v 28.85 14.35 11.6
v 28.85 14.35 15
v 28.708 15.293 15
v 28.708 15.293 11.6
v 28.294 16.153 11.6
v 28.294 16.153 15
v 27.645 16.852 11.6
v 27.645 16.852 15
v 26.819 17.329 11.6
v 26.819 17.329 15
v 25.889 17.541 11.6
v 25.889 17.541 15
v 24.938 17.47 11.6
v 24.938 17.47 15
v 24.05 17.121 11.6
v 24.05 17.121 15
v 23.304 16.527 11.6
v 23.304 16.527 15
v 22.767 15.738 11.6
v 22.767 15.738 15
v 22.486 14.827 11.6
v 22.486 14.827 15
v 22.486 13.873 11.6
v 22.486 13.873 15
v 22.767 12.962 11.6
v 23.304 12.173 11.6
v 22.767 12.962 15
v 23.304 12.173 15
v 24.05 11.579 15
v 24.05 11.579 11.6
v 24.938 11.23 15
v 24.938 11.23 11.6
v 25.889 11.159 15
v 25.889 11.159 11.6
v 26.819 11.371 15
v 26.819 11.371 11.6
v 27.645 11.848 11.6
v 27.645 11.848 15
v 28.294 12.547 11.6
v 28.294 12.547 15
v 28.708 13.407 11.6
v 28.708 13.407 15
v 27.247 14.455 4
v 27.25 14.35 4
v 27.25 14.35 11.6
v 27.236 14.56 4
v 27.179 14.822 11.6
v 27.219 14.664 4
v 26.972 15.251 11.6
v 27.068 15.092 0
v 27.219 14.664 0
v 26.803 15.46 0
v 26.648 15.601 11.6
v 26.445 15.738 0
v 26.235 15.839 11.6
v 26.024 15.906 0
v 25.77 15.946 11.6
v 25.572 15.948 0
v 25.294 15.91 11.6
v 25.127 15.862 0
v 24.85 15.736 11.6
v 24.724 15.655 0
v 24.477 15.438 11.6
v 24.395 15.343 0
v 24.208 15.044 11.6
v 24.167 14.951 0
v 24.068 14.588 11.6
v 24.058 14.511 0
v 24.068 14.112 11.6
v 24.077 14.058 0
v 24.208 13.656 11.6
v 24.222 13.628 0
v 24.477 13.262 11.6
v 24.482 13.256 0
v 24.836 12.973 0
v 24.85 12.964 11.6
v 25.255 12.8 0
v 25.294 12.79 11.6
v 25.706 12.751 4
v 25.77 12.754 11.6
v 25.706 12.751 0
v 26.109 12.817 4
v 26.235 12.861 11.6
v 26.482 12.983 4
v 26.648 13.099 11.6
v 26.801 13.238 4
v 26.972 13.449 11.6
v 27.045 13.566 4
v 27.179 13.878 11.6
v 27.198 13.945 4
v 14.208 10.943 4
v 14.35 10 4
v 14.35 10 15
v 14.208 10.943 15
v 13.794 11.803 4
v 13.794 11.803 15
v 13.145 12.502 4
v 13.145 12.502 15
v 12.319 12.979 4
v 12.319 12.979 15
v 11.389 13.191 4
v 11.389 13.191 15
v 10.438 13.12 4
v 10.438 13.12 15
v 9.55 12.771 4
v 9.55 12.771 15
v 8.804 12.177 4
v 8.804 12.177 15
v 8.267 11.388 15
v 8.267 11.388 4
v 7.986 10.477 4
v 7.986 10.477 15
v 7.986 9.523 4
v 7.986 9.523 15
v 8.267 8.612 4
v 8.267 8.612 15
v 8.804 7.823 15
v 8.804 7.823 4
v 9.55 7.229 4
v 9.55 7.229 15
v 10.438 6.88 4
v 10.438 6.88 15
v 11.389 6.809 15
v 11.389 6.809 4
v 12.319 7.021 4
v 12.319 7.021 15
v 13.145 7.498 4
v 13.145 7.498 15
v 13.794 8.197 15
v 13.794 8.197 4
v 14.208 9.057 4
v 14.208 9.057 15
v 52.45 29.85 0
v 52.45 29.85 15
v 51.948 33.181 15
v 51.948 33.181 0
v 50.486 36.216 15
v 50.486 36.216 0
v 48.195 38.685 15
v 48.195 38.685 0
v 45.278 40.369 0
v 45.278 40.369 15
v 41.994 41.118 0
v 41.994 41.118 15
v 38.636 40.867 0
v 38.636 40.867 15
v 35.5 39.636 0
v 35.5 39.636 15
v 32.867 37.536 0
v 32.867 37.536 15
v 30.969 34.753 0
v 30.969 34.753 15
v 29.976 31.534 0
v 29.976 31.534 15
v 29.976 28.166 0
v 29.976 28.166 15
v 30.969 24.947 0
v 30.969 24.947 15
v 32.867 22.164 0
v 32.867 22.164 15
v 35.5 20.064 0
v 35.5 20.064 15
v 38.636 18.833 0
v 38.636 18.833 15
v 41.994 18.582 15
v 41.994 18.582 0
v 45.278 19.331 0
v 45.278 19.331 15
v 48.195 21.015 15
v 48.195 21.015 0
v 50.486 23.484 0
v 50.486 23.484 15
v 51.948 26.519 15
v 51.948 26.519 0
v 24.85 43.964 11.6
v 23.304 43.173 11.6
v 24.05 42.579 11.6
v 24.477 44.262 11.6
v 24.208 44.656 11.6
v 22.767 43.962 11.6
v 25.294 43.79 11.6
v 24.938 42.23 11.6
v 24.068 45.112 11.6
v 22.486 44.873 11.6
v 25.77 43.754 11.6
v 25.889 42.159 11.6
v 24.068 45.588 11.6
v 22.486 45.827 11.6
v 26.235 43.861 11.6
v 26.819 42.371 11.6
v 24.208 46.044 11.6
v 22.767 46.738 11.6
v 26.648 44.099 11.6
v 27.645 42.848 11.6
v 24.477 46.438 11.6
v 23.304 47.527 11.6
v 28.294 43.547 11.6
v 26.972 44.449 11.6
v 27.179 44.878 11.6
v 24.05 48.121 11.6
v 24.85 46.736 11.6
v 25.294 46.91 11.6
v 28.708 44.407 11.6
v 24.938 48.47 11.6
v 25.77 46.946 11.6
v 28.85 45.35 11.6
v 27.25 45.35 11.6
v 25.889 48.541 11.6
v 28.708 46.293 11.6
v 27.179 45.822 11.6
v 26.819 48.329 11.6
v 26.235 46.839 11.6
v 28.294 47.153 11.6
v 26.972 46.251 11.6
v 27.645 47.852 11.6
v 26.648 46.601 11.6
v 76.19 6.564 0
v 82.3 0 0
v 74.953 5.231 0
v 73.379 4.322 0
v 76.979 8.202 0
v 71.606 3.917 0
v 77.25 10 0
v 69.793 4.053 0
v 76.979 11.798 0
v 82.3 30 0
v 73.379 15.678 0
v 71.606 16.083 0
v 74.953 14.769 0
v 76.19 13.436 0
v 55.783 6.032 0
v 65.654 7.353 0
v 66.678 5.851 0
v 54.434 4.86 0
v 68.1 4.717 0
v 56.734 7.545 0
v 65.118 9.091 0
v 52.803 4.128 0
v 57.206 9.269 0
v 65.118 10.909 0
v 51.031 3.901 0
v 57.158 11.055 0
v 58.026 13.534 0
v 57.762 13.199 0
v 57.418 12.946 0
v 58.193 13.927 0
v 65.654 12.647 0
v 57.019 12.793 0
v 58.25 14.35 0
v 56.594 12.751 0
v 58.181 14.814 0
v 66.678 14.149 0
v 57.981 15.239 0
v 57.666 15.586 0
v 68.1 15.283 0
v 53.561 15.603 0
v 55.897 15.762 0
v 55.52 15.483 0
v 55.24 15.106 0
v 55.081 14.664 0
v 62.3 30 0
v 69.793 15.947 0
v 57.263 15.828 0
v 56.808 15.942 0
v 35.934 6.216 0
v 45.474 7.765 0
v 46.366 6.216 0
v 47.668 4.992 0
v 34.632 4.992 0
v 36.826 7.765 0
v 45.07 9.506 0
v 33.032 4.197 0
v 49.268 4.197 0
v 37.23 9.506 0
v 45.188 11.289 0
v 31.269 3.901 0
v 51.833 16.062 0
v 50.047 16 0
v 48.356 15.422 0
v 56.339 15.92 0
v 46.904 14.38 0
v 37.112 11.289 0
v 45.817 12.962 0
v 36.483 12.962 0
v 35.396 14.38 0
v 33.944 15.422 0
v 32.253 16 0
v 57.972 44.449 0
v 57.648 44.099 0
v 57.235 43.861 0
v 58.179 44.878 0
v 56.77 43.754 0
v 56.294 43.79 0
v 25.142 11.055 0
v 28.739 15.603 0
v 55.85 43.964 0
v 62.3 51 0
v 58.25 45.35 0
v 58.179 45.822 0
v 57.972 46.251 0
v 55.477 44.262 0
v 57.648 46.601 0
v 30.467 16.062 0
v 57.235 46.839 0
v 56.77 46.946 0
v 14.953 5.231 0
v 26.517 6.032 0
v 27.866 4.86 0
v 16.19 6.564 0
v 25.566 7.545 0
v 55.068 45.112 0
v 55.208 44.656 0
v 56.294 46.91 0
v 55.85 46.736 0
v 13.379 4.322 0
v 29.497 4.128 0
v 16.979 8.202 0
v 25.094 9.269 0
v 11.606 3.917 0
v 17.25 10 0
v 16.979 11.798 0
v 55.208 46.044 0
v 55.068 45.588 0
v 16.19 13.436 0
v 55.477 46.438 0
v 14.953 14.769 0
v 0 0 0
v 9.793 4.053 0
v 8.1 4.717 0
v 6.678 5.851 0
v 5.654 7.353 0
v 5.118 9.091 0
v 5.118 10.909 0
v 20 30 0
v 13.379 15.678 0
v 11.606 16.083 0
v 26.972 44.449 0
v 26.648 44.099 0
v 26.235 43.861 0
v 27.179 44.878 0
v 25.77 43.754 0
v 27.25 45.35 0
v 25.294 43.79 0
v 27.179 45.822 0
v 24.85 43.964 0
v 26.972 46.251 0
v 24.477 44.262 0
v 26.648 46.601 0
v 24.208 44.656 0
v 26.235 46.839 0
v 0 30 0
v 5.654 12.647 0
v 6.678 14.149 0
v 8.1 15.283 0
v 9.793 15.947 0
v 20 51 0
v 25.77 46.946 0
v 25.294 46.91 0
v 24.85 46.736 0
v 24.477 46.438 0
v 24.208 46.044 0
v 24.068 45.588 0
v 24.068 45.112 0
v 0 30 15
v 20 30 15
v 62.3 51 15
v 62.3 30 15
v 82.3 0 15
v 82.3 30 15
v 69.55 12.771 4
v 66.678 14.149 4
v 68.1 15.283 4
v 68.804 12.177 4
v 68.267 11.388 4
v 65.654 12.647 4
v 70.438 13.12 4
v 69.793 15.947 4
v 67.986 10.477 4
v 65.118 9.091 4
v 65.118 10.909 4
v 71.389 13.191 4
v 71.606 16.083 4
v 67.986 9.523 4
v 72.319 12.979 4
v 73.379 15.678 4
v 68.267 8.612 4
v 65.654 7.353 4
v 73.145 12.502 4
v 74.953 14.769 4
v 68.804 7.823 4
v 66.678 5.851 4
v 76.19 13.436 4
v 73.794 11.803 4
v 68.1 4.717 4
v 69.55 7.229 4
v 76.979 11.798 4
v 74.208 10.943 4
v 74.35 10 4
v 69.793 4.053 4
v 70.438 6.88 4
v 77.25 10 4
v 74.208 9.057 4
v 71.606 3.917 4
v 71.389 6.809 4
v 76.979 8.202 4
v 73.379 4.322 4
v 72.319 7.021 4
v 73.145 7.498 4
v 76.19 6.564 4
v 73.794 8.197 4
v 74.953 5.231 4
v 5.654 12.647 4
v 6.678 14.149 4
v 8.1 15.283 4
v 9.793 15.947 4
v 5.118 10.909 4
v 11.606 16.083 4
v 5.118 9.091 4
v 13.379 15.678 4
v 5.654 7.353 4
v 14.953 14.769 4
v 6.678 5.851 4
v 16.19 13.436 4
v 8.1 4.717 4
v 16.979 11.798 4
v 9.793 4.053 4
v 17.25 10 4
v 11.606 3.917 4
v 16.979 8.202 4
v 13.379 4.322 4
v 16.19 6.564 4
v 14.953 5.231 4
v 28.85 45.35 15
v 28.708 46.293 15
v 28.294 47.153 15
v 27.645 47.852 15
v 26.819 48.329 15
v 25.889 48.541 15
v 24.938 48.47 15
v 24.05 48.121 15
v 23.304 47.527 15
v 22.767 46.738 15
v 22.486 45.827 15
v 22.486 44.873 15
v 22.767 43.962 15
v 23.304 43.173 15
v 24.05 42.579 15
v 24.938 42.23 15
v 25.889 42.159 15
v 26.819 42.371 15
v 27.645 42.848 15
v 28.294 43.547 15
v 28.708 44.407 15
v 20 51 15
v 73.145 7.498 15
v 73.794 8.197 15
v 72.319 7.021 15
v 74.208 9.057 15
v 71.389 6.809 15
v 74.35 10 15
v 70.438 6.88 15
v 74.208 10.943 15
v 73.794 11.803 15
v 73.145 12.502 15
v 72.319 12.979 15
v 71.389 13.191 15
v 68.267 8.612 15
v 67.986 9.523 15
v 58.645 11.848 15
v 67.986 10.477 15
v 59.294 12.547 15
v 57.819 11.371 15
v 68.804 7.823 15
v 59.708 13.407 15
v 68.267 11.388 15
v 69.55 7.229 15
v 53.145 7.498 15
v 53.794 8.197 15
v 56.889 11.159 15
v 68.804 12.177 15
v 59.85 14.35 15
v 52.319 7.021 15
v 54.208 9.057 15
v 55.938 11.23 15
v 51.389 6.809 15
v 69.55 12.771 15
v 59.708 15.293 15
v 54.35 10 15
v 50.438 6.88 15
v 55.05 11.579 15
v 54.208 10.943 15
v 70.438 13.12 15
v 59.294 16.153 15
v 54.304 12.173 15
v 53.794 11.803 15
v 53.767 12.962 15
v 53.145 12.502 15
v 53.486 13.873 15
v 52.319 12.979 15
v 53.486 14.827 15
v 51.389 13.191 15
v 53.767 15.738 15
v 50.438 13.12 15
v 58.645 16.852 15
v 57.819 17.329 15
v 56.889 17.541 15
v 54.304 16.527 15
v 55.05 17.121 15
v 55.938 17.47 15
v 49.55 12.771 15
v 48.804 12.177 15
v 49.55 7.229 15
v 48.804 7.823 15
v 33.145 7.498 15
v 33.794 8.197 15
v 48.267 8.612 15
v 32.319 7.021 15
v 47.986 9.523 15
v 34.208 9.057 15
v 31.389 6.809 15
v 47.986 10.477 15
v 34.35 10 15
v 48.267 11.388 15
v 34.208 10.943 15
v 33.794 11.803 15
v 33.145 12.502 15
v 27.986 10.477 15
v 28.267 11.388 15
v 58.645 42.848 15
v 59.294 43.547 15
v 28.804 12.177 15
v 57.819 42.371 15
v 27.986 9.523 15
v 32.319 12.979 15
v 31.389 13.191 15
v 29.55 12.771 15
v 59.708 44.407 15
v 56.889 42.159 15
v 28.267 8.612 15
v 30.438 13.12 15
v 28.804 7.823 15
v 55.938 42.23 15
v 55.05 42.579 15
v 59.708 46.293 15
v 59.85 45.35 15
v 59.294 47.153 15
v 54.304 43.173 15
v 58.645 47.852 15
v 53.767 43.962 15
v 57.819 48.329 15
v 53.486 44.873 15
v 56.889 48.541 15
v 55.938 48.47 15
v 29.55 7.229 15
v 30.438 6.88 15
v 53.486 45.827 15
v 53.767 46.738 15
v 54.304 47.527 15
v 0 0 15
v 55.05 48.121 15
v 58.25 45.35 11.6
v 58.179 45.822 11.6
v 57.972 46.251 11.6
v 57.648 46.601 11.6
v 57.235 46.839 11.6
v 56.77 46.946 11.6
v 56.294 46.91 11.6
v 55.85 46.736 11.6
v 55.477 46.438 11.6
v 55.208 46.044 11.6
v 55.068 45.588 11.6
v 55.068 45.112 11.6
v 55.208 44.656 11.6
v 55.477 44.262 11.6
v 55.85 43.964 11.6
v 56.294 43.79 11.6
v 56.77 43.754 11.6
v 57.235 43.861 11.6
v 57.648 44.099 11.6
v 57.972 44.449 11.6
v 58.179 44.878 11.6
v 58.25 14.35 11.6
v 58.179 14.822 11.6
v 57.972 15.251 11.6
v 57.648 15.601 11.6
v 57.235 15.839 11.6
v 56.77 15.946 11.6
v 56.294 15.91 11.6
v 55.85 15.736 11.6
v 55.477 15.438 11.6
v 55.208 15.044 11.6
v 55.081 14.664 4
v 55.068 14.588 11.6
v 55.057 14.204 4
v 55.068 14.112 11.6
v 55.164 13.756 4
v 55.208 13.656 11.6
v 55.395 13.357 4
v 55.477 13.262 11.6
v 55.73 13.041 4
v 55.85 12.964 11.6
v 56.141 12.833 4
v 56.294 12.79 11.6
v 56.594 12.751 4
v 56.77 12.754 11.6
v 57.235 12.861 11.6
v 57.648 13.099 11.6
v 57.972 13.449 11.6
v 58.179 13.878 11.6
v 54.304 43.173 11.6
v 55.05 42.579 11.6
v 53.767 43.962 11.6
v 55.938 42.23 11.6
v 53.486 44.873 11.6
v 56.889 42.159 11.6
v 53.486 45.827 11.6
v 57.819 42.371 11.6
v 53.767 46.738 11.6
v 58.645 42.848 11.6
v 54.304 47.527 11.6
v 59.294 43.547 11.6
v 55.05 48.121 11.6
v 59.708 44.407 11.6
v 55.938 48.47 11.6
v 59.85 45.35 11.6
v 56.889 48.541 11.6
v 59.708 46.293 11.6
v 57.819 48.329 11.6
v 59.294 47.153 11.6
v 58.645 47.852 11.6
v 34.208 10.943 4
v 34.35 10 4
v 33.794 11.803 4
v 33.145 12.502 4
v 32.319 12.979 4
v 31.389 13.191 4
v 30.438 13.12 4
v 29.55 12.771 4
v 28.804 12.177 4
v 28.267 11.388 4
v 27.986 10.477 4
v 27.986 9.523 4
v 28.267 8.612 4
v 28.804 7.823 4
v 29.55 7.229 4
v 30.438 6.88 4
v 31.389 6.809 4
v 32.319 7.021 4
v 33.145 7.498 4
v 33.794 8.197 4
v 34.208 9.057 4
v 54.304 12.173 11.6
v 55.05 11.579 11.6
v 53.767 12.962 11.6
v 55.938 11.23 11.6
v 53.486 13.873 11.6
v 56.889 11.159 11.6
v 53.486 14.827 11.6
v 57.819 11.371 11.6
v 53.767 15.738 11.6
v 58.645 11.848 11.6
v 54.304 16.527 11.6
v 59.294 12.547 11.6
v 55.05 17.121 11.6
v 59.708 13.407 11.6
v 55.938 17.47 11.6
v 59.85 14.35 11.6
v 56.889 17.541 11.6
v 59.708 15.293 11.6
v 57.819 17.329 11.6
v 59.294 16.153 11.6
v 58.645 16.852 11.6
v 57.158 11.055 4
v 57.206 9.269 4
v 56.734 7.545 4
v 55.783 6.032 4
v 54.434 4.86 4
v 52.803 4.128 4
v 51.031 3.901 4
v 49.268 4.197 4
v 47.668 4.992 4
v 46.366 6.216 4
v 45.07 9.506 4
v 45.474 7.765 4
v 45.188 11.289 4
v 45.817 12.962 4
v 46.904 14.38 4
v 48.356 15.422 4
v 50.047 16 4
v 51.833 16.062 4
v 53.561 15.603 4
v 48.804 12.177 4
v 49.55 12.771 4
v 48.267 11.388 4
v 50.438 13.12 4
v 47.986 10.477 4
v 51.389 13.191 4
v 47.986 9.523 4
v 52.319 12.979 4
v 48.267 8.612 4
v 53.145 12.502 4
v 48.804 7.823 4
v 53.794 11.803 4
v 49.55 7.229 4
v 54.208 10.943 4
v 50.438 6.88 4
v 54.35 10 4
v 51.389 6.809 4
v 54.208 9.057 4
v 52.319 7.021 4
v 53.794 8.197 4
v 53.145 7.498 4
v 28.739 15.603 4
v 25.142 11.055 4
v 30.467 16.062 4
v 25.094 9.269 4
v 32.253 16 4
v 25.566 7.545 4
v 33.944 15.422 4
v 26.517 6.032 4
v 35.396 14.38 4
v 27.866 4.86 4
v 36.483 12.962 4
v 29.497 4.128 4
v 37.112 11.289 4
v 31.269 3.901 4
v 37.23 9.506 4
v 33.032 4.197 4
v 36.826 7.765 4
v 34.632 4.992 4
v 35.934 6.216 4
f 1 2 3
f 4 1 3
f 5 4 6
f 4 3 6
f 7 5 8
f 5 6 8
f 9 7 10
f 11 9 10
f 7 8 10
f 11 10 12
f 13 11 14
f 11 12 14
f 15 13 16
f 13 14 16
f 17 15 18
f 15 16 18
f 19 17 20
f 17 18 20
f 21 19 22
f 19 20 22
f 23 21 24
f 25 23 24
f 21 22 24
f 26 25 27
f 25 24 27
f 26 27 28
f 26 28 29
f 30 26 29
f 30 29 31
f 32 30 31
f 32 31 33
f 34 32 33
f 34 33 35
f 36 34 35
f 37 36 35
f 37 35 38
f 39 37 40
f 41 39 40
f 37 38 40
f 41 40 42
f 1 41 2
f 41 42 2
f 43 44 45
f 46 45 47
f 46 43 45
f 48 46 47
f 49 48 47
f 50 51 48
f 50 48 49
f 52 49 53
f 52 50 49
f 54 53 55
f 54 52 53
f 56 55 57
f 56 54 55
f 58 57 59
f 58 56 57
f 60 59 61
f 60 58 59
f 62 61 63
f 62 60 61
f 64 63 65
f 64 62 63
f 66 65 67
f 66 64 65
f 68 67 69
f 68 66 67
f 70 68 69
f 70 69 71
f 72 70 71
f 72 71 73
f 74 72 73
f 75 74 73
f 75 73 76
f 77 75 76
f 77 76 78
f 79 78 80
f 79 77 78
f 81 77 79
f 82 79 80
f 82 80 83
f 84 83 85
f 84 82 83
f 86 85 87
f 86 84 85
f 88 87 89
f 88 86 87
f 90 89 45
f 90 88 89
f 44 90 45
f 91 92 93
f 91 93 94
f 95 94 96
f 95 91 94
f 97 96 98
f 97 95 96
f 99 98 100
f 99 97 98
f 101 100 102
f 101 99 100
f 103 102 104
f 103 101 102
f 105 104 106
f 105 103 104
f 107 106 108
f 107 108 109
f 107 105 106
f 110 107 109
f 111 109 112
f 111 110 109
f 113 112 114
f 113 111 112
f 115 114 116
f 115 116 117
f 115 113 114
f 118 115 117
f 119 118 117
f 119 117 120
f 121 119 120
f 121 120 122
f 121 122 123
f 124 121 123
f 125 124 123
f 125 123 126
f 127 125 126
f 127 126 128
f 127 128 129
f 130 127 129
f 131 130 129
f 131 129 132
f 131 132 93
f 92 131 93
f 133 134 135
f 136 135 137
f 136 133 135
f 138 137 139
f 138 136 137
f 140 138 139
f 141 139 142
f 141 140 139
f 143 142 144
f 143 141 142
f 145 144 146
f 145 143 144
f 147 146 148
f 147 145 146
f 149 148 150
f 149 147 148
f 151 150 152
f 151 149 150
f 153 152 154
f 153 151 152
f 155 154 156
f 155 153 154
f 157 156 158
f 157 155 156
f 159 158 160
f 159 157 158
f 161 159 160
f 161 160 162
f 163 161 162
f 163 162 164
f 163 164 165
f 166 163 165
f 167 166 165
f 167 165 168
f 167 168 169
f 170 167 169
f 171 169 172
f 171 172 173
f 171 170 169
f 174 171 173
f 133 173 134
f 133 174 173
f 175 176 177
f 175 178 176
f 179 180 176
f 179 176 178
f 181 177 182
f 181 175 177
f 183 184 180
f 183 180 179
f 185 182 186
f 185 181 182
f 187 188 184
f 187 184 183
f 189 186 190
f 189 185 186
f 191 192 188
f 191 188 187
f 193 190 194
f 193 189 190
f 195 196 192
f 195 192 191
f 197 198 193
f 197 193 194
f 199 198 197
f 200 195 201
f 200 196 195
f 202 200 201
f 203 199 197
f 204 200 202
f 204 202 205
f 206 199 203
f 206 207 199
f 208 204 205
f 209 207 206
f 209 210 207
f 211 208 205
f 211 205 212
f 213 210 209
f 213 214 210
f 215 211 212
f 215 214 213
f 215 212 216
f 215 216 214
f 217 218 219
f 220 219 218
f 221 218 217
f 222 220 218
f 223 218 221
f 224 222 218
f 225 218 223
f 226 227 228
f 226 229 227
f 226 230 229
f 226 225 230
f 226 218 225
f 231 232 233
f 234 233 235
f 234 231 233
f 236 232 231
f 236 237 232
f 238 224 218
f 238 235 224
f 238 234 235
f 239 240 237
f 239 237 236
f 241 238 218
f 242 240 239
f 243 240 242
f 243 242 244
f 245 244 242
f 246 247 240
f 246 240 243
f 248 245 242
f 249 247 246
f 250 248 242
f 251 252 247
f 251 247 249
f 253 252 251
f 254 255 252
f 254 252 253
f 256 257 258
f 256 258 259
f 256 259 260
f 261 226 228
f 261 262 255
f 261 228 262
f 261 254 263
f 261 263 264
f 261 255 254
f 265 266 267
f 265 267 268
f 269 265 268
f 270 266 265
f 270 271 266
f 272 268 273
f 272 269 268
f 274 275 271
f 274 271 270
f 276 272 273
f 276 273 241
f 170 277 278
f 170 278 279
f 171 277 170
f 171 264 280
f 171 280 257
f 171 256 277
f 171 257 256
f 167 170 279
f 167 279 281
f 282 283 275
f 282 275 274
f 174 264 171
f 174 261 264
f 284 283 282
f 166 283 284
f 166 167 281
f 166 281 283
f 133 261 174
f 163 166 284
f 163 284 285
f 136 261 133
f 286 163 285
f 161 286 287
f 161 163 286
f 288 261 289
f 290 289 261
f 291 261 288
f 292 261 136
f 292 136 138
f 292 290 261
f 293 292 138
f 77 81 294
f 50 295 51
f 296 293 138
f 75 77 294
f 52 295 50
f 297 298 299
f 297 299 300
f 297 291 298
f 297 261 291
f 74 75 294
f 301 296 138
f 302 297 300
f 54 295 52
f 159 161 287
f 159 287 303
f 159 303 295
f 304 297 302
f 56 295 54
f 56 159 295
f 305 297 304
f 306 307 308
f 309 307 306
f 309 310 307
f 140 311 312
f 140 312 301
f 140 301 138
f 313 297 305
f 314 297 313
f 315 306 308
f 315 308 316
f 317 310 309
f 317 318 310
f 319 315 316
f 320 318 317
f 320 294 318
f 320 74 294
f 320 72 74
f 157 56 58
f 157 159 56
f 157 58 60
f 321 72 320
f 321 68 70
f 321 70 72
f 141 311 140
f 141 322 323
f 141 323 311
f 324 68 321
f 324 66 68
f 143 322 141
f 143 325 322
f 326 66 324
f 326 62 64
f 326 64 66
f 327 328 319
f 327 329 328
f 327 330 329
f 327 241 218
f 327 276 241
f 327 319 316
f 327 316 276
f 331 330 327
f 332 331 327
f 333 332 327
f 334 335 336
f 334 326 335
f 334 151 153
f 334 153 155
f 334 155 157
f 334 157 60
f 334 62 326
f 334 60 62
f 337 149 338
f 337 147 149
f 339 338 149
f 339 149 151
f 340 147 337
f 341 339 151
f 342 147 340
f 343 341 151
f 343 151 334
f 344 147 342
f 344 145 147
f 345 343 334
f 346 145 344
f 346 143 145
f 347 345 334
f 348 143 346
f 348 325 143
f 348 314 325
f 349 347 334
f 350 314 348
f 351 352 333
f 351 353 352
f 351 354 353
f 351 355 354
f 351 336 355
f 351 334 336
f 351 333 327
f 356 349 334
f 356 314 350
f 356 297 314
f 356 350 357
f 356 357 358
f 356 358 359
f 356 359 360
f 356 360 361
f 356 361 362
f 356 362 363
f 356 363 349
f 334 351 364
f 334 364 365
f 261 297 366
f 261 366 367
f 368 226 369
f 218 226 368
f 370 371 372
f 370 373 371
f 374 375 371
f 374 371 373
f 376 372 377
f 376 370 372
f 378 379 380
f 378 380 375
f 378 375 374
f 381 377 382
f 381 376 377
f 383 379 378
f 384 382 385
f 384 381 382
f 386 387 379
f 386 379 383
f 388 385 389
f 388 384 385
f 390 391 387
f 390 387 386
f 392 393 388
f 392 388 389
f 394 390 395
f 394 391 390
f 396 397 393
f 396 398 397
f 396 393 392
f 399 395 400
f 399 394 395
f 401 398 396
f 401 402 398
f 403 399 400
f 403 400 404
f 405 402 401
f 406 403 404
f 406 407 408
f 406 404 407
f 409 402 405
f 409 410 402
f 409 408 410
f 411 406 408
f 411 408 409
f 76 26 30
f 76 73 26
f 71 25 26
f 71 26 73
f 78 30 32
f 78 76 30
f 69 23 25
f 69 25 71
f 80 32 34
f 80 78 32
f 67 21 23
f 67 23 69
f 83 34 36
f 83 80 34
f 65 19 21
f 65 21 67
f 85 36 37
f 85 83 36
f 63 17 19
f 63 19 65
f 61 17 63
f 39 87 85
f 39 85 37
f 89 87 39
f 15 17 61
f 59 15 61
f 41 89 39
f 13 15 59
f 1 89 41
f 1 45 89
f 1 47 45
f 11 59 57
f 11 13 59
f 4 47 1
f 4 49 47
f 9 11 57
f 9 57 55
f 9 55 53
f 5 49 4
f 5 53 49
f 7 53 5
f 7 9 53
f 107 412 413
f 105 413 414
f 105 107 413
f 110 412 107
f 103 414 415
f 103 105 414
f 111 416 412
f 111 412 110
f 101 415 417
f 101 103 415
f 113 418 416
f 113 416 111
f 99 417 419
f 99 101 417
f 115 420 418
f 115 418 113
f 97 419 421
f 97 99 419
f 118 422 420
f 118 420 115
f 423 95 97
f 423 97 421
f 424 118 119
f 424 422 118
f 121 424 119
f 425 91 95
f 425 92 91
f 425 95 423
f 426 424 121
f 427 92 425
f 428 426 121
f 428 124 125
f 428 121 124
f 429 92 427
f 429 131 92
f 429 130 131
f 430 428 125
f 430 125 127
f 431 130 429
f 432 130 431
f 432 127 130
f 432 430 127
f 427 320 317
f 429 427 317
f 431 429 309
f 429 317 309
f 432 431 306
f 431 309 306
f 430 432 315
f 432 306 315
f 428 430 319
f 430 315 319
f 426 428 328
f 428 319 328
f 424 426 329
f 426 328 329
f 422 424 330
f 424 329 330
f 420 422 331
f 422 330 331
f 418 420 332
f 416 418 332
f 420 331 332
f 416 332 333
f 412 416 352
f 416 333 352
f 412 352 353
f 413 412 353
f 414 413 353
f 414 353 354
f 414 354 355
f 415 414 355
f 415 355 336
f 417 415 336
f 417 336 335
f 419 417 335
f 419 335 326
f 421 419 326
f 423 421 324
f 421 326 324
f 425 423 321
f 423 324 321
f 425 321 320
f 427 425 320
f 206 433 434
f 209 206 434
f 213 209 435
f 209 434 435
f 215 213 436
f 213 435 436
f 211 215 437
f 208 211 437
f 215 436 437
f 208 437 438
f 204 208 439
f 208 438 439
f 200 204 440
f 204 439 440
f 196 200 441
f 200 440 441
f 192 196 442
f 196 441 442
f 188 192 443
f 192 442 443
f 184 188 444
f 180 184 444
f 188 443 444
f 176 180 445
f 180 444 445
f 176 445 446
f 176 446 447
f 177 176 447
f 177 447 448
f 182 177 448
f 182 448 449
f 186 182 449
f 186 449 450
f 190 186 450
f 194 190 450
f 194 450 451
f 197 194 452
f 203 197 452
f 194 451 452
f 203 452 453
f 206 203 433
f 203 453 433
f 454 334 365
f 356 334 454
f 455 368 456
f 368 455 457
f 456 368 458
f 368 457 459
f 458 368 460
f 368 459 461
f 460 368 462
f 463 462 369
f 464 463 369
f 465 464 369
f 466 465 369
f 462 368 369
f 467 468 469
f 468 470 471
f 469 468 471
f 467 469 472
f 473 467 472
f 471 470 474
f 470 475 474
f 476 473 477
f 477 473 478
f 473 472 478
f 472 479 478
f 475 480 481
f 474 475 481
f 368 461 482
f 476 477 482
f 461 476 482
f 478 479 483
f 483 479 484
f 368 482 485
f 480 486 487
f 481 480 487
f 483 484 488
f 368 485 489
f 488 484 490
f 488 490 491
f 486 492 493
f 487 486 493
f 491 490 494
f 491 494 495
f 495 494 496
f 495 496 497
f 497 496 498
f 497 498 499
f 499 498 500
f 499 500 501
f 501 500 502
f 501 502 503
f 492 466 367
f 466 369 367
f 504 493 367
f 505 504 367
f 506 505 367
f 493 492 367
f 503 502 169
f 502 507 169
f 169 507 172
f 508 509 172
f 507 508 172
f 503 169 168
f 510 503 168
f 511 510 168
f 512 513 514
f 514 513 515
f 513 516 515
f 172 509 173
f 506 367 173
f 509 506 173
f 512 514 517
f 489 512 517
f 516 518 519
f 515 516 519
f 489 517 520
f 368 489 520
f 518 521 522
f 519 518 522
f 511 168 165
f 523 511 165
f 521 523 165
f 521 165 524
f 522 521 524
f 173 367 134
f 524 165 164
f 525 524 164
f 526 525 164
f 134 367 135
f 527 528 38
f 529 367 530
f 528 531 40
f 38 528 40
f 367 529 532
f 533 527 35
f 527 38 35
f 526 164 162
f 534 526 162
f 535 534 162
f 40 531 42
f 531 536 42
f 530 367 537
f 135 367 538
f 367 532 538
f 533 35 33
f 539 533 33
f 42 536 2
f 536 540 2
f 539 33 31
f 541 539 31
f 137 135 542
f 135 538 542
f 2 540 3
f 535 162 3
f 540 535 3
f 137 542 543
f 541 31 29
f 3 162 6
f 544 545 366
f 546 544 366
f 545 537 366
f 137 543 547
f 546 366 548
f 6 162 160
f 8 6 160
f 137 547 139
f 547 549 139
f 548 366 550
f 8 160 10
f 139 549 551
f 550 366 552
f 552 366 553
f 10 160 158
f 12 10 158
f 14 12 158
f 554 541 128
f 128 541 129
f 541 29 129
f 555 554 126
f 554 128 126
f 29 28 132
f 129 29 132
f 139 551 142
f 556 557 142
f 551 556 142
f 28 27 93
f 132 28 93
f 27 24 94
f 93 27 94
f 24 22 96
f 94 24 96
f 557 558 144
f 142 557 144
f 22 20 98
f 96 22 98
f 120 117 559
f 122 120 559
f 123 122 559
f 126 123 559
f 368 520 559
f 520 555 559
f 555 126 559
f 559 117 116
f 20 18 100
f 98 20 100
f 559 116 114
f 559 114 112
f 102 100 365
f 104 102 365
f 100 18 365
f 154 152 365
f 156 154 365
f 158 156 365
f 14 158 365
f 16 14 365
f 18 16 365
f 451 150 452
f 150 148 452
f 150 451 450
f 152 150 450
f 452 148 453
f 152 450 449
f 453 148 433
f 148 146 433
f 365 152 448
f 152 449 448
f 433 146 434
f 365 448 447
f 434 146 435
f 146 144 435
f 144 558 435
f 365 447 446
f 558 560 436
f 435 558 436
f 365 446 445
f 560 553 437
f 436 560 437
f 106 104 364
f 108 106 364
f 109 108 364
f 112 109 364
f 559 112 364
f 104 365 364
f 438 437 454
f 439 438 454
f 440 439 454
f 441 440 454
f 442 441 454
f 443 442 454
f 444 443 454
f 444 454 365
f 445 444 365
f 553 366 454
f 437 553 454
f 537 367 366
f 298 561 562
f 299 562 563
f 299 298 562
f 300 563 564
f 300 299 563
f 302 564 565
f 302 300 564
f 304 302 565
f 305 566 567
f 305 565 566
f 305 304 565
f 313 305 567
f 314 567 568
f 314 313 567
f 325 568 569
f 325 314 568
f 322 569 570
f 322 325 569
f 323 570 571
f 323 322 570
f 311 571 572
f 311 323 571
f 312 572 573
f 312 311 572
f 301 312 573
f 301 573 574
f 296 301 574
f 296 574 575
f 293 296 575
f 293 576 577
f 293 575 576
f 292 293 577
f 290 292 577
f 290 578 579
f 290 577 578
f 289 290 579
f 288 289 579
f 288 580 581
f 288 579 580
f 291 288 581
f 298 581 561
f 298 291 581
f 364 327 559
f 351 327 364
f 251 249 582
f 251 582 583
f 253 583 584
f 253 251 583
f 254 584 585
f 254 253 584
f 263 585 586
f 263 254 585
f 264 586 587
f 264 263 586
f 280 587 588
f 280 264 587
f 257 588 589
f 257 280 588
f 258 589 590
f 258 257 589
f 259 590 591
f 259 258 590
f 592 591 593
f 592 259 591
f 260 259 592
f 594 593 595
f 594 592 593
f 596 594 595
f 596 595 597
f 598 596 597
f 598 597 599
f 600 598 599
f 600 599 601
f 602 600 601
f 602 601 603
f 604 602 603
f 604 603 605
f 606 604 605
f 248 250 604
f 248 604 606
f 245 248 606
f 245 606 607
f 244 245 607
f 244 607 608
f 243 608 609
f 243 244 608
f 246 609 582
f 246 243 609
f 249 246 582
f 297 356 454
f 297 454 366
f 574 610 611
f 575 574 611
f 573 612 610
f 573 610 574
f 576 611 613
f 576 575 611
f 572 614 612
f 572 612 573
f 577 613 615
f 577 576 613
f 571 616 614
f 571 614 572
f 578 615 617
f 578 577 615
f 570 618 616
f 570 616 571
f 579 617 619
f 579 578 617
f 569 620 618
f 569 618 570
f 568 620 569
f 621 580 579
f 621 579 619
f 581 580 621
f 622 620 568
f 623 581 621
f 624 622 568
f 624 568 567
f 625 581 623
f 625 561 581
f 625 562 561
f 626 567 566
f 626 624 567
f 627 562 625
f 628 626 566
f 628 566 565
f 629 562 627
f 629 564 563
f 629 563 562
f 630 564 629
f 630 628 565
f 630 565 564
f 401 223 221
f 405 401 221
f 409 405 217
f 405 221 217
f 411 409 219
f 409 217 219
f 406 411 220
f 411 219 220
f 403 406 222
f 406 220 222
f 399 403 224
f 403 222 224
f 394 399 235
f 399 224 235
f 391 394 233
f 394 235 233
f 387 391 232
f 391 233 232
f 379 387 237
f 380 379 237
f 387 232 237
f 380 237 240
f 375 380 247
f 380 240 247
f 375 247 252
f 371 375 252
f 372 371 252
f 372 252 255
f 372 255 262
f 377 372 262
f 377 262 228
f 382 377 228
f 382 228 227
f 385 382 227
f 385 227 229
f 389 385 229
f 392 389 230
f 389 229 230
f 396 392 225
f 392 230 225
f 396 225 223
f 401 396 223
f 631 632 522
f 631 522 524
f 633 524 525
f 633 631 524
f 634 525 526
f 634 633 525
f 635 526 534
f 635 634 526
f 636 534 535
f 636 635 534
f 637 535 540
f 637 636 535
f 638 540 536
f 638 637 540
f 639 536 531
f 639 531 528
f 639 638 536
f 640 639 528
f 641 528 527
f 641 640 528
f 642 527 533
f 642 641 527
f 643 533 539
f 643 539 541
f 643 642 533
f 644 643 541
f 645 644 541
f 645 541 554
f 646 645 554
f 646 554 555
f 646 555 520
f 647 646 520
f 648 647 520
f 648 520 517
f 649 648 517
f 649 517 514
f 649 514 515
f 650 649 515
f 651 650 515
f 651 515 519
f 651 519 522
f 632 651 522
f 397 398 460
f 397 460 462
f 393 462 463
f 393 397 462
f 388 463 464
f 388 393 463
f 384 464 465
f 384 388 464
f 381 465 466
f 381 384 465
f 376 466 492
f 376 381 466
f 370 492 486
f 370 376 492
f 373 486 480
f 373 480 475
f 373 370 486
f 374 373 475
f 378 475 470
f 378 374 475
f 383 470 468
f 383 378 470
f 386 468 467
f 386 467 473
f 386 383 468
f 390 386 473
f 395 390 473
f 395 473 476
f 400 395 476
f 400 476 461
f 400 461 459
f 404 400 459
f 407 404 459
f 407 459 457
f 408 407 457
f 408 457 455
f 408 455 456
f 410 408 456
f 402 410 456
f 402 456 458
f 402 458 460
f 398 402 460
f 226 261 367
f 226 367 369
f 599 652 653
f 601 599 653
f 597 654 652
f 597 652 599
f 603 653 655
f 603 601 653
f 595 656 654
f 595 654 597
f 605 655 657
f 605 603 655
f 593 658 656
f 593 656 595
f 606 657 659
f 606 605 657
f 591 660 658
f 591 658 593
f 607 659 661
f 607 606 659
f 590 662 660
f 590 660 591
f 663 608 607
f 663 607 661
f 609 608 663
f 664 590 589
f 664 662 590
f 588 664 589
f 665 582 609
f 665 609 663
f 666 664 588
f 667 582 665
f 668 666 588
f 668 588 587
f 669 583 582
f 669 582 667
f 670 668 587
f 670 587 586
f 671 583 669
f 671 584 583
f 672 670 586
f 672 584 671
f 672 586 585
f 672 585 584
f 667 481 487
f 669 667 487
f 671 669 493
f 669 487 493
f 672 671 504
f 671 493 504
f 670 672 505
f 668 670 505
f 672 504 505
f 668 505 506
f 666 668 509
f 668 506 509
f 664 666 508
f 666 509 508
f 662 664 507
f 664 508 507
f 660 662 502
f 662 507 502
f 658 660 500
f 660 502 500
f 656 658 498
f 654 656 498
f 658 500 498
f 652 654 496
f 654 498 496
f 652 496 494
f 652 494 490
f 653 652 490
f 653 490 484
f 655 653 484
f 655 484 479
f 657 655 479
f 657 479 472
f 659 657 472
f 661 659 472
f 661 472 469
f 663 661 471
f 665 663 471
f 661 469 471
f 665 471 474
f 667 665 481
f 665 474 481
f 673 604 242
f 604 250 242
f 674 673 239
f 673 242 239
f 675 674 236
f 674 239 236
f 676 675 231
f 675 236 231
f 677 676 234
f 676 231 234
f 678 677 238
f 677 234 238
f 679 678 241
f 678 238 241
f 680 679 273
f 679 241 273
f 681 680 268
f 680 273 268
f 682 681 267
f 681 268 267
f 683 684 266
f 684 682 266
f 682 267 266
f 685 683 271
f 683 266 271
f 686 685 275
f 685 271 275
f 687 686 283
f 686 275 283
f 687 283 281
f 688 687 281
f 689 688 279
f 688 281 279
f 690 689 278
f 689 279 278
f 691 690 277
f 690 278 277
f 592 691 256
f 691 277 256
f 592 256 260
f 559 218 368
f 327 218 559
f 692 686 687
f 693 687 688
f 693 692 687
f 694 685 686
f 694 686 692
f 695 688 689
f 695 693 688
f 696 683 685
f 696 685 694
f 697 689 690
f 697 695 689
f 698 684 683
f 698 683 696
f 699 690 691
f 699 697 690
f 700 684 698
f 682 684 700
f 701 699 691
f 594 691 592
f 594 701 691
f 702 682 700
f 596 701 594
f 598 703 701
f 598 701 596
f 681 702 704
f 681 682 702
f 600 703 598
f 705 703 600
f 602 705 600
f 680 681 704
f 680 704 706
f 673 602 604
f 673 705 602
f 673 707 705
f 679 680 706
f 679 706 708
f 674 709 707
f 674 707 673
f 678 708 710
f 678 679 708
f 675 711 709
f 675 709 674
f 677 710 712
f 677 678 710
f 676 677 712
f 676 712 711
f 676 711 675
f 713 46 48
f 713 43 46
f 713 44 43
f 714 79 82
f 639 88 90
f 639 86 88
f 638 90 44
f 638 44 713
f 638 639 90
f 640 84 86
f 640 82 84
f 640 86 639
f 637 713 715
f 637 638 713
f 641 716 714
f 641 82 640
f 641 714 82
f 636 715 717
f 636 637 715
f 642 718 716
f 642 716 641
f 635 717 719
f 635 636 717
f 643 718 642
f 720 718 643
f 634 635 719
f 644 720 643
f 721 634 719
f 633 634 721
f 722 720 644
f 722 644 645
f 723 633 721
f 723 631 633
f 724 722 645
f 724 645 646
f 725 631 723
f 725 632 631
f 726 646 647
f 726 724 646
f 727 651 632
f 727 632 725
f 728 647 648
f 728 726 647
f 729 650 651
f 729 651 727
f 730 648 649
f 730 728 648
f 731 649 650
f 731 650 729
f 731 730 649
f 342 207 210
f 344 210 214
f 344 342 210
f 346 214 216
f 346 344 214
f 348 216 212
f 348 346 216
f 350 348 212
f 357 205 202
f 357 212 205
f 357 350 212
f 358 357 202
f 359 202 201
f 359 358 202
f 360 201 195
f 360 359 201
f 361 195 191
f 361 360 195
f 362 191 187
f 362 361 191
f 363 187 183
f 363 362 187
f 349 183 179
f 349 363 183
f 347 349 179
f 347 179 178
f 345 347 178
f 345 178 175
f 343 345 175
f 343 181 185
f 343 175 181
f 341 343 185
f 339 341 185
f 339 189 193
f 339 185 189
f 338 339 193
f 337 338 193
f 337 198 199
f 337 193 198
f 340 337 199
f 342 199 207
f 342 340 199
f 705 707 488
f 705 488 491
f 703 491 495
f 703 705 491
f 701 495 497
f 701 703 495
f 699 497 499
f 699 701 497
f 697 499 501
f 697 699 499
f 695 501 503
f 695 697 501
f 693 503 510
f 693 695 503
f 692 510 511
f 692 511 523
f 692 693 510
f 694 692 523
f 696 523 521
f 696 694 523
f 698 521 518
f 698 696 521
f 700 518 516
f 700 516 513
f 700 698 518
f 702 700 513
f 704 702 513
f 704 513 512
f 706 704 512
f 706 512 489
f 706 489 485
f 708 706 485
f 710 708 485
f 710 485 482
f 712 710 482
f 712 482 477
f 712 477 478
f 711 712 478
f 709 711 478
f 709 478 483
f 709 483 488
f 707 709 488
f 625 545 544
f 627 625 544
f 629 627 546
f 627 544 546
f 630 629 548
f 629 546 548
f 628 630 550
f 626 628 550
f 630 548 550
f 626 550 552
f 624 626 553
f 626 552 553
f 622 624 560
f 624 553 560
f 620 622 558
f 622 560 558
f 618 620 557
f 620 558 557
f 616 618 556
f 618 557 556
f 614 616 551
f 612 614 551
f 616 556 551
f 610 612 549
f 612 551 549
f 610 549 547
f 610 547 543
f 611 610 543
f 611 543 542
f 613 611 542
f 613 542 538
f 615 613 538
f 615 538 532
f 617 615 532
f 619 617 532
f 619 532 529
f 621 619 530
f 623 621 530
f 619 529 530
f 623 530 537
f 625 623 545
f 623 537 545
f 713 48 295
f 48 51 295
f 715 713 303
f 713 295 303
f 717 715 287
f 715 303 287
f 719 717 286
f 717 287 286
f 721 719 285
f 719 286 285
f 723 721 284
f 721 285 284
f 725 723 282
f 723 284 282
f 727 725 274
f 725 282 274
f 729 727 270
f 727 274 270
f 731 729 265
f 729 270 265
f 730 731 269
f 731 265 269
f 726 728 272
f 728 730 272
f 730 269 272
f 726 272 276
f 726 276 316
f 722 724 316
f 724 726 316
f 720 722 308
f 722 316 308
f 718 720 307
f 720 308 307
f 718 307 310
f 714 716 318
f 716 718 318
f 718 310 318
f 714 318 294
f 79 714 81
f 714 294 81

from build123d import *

# Parameters (mm, degrees)
SKETCH_R        = 11.3
SKETCH_R_2      = 1.6
SKETCH_R_3      = 3.2
PAD_DEPTH       = 15
SKETCH001_R     = 3.2
POCKET_DEPTH    = 3.4
SKETCH002_R     = 6.1
POCKET001_DEPTH = 4


with BuildPart() as part:
    # Sketch → Pad (new body)
    with BuildSketch(Plane.XY):
        Polygon((20, 30), (20, 51), (62.3, 51), (62.3, 30), (82.3, 30), (82.3, 0), (0, 0), (0, 30), align=None)
        with Locations((41.15, 29.85)):
            Circle(SKETCH_R, mode=Mode.SUBTRACT)
        with Locations((25.65, 45.35)):
            Circle(SKETCH_R_2, mode=Mode.SUBTRACT)
        with Locations((25.65, 14.35)):
            Circle(SKETCH_R_2, mode=Mode.SUBTRACT)
        with Locations((56.65, 45.35)):
            Circle(SKETCH_R_2, mode=Mode.SUBTRACT)
        with Locations((56.65, 14.35)):
            Circle(SKETCH_R_2, mode=Mode.SUBTRACT)
        with Locations((11.15, 10)):
            Circle(SKETCH_R_3, mode=Mode.SUBTRACT)
        with Locations((31.15, 10)):
            Circle(SKETCH_R_3, mode=Mode.SUBTRACT)
        with Locations((51.15, 10)):
            Circle(SKETCH_R_3, mode=Mode.SUBTRACT)
        with Locations((71.15, 10)):
            Circle(SKETCH_R_3, mode=Mode.SUBTRACT)
    extrude(amount=PAD_DEPTH)

    # Sketch001 (on Face19 of Pad) → Pocket (cut)
    with BuildSketch(Plane.XY.offset(15)):
        with Locations((25.65, 45.35)):
            Circle(SKETCH001_R)
        with Locations((56.65, 45.35)):
            Circle(SKETCH001_R)
        with Locations((56.65, 14.35)):
            Circle(SKETCH001_R)
        with Locations((25.65, 14.35)):
            Circle(SKETCH001_R)
    extrude(amount=-POCKET_DEPTH, mode=Mode.SUBTRACT)

    # Sketch002 (on Face4 of Pocket) → Pocket001 (cut)
    with BuildSketch(Plane(origin=(0, 0, 0), x_dir=(1, 0, 0), z_dir=(0, 0, -1))):
        with Locations((11.15, -10)):
            Circle(SKETCH002_R)
        with Locations((31.15, -10)):
            Circle(SKETCH002_R)
        with Locations((51.15, -10)):
            Circle(SKETCH002_R)
        with Locations((71.15, -10)):
            Circle(SKETCH002_R)
    extrude(amount=-POCKET001_DEPTH, mode=Mode.SUBTRACT)


solid = part.part
